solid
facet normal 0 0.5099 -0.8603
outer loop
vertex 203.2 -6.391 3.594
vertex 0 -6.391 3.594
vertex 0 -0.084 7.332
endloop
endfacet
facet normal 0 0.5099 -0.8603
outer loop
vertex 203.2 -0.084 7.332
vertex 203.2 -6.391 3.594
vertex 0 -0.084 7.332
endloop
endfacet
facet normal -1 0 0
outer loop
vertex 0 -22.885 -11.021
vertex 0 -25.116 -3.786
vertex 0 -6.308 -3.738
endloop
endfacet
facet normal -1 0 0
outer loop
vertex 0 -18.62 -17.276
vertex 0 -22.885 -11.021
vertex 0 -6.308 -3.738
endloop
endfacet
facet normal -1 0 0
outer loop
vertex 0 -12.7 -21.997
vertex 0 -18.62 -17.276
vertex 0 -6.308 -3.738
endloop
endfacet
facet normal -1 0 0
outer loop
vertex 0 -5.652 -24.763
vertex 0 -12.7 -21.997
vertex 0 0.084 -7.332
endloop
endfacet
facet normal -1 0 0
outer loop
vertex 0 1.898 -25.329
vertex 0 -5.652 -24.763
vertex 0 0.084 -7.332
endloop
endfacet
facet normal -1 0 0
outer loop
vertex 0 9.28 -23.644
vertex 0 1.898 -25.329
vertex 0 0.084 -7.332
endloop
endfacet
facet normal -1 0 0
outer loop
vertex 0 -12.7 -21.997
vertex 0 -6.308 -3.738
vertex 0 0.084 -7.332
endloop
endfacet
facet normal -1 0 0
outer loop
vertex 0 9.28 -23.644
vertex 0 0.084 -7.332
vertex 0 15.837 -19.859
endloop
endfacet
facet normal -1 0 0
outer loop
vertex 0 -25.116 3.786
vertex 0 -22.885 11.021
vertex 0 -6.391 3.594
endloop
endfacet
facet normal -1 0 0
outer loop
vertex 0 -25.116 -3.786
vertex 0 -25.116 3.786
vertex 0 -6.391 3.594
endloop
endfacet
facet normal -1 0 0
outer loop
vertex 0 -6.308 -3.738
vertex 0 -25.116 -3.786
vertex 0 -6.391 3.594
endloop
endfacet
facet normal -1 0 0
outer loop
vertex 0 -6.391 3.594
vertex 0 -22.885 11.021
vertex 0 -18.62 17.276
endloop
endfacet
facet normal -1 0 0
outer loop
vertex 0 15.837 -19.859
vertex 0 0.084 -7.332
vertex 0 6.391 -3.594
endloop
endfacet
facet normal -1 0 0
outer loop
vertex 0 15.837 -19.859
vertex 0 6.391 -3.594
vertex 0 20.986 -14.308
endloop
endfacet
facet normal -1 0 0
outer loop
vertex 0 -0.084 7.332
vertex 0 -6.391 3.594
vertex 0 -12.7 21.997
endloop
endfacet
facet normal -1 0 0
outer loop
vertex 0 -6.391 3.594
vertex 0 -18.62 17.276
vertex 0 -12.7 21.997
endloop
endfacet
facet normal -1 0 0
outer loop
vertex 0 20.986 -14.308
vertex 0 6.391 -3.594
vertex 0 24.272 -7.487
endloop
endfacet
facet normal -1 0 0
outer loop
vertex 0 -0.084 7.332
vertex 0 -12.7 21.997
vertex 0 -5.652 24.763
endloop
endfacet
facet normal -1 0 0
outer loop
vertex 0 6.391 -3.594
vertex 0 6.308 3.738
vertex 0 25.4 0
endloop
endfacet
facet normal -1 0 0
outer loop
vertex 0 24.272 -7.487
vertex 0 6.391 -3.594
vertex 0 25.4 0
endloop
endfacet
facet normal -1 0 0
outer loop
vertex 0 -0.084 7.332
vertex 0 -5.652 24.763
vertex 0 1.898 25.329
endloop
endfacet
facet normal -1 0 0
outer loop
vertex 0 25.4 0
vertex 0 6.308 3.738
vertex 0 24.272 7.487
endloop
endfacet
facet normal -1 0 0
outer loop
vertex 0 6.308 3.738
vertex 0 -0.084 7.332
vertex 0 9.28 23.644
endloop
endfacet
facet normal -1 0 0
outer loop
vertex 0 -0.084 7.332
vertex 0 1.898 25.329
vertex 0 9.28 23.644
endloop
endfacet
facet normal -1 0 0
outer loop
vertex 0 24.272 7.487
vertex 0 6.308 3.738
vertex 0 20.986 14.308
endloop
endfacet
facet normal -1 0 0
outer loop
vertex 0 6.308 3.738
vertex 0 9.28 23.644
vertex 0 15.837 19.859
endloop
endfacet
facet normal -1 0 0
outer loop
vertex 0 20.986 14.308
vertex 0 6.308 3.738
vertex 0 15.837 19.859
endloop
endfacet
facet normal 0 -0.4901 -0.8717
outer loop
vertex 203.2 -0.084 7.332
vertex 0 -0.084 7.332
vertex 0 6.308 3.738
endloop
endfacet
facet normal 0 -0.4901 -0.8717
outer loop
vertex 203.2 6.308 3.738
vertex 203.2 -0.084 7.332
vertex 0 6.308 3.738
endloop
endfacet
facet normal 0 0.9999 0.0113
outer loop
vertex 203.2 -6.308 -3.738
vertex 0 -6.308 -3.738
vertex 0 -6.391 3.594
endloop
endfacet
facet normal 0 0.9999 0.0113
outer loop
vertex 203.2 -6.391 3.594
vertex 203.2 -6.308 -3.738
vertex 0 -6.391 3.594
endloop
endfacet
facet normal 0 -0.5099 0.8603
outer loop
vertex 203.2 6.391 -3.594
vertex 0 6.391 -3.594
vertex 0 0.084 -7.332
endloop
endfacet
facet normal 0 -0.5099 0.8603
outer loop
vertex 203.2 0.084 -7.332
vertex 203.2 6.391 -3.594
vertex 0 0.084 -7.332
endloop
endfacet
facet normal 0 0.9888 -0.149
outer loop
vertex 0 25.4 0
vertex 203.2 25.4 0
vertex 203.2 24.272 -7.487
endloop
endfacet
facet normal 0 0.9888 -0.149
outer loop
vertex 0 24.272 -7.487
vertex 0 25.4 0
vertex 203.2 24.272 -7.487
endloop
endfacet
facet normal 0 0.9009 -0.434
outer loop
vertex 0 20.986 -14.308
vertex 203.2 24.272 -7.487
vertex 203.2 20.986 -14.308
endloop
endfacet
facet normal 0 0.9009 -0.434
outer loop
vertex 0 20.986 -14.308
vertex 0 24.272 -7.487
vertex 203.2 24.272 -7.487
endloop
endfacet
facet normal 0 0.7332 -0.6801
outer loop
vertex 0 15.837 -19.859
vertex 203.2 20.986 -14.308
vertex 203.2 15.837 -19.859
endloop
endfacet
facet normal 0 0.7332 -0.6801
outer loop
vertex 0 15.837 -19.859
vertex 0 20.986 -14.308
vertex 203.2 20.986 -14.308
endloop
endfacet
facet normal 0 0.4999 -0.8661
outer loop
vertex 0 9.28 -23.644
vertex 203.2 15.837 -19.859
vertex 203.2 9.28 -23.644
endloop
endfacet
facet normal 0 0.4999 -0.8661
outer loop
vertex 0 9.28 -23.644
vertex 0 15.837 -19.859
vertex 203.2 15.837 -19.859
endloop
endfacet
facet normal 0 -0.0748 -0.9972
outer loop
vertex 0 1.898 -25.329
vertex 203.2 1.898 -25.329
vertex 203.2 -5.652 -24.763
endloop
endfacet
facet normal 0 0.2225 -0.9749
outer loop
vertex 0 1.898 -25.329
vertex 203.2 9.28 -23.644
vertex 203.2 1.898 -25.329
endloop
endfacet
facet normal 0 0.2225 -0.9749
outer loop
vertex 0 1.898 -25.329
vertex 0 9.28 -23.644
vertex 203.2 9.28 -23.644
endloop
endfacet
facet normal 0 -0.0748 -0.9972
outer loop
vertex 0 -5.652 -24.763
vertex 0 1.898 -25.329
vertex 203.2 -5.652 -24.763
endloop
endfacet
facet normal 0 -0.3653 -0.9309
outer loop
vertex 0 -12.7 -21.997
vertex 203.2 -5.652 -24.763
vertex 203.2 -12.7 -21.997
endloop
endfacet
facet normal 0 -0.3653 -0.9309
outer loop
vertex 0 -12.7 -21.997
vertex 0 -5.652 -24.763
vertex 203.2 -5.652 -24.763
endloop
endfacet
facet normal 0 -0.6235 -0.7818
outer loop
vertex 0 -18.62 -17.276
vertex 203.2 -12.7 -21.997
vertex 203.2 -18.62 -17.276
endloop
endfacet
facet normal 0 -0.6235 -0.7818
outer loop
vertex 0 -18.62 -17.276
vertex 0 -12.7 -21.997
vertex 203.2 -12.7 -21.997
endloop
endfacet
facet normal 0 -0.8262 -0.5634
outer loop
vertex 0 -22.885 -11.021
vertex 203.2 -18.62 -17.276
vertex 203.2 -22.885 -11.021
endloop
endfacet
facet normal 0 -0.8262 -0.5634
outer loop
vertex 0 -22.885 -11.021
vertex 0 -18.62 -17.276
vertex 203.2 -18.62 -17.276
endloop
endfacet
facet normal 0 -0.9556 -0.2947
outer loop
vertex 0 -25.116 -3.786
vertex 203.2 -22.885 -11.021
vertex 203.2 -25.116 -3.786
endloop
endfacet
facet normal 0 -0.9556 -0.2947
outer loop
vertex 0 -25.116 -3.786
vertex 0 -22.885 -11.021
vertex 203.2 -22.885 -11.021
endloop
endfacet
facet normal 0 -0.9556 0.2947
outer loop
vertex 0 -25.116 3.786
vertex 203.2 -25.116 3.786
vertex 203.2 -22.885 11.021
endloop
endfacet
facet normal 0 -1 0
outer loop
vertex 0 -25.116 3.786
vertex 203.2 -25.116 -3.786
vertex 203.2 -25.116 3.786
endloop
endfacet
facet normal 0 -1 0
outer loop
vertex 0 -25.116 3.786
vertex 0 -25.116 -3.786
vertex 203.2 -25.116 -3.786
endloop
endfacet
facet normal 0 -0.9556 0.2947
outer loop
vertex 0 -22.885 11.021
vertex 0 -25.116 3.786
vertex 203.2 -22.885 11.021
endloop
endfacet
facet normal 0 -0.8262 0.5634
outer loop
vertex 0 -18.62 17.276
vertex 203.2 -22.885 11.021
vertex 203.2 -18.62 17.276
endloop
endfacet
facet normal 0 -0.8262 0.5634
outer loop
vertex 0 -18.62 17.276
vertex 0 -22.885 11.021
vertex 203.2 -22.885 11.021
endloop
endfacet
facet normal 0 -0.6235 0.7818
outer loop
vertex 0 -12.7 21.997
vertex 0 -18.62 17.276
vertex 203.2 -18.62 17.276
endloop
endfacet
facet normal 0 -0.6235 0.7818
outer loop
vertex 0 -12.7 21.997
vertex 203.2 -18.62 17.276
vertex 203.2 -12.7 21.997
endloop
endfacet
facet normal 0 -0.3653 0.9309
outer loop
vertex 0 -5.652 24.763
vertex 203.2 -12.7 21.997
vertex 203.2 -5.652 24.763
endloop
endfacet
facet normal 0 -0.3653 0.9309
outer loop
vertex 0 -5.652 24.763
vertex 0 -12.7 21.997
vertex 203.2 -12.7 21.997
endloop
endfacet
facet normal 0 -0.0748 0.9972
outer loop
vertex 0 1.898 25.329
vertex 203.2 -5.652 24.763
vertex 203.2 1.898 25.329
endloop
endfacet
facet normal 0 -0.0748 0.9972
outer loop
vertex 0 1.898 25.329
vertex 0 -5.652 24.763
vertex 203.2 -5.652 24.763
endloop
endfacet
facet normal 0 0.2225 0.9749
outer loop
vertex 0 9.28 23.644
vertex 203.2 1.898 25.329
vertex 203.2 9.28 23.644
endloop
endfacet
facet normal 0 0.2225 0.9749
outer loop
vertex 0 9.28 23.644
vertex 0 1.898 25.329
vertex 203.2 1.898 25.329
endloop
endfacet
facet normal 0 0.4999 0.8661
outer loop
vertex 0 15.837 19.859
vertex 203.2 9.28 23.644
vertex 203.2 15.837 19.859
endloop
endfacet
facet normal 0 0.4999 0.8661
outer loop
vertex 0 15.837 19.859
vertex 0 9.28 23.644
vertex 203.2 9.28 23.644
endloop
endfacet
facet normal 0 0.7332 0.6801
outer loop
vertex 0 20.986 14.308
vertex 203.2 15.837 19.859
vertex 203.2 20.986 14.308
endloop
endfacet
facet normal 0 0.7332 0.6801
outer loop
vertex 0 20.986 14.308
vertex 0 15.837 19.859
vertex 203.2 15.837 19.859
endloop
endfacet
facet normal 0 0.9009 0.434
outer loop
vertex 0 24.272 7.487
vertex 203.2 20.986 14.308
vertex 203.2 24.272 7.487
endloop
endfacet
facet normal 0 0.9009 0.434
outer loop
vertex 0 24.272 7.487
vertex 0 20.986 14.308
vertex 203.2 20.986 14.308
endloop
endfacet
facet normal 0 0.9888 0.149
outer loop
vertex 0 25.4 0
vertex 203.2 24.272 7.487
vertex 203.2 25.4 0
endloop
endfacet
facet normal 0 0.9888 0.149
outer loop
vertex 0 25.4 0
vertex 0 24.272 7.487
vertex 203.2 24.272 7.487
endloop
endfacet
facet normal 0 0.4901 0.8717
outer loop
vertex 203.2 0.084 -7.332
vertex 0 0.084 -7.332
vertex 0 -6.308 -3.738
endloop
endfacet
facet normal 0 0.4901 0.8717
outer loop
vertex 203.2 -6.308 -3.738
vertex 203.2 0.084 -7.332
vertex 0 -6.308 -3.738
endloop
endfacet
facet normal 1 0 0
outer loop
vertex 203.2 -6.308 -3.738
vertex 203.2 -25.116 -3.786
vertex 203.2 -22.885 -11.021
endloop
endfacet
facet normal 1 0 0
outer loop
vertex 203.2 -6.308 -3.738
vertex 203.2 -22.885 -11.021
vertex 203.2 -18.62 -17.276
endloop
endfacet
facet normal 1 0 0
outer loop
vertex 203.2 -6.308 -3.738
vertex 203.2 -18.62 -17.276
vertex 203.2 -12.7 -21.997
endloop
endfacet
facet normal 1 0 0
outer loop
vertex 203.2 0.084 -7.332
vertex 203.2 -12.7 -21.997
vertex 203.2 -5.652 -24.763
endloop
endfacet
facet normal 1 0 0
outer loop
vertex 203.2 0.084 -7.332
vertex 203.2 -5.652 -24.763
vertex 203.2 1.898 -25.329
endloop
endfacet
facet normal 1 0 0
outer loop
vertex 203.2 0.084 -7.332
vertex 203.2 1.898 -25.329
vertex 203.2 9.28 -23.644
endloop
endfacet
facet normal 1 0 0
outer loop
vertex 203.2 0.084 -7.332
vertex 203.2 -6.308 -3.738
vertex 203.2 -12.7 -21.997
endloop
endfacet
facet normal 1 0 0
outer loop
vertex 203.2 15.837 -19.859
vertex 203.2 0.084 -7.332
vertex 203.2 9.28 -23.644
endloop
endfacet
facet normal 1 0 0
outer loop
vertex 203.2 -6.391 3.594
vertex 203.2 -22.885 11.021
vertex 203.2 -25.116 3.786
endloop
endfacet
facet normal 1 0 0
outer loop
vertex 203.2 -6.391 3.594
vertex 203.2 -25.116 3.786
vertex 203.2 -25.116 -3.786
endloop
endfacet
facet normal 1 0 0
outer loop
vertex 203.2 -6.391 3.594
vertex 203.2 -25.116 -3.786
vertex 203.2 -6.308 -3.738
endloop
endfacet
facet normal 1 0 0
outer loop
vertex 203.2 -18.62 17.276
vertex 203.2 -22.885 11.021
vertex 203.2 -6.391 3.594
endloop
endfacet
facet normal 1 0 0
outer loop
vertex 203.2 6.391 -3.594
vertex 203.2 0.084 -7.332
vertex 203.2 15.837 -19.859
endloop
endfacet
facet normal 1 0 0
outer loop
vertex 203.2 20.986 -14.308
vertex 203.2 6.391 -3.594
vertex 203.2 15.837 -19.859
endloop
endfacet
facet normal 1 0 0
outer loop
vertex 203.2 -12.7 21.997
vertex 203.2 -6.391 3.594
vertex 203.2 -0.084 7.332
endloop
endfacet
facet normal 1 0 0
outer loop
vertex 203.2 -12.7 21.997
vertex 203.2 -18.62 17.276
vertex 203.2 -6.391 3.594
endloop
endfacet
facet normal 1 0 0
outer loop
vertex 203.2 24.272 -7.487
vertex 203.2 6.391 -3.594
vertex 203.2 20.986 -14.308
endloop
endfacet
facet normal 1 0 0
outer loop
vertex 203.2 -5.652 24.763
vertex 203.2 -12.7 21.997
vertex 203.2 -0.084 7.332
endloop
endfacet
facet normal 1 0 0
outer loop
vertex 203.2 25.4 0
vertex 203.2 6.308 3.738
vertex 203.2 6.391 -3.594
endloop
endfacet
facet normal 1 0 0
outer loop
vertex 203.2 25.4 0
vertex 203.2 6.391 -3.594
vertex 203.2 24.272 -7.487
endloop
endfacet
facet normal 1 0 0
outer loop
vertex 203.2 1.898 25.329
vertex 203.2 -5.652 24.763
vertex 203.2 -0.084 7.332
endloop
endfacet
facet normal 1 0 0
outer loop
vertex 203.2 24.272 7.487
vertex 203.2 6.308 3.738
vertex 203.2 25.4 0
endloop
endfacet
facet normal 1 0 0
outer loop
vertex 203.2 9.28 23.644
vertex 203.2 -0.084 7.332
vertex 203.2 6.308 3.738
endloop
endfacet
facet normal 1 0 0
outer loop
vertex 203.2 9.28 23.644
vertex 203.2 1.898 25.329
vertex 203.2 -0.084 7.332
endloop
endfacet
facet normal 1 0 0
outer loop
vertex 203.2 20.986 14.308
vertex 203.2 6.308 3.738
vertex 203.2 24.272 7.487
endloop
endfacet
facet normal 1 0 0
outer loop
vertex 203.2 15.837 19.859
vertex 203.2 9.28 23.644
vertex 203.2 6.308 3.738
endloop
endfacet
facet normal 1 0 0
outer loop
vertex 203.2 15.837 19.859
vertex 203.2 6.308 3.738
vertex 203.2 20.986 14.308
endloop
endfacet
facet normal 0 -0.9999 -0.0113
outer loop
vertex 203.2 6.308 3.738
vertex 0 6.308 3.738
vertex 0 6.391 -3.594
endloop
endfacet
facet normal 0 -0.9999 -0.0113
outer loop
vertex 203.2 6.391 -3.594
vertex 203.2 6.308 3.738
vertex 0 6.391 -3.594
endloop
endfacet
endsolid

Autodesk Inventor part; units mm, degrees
ref_plane "YZ Plane" through (0, 0, 0) normal (1, 0, 0) x (0, 1, 0)
ref_plane "XZ Plane" through (0, 0, 0) normal (0, 1, 0) x (-1, 0, 0)
ref_plane "XY Plane" through (0, 0, 0) normal (0, 0, 1) x (1, 0, 0)
sketch "Sketch1" plane through (0, 0, 0) normal (1, 0, 0) x (0, 1, 0)
  circle A0 centre (0, 0) radius 25.4
  line L0 (6.3913, -3.5936) -> (0.0835, -7.3319)
  line L1 (0.0835, -7.3319) -> (-6.3079, -3.7382)
  line L2 (-6.3079, -3.7382) -> (-6.3913, 3.5936)
  line L3 (-6.3913, 3.5936) -> (-0.0835, 7.3319)
  line L4 (-0.0835, 7.3319) -> (6.3079, 3.7382)
  line L5 (6.3079, 3.7382) -> (6.3913, -3.5936)
  dimension "d0" = 50.8
  dimension "d6" = 6.35
extrude "Extrusion1" add sketch "Sketch1" along normal blind 203.2 contours A0 | L0 L1 L2 L3 L4 L5
extrude "Extrusion2" cut sketch "Sketch1" along normal through all contours L0 L1 L2 L3 L4 L5
properties part number "Roller" material "Rubber"
